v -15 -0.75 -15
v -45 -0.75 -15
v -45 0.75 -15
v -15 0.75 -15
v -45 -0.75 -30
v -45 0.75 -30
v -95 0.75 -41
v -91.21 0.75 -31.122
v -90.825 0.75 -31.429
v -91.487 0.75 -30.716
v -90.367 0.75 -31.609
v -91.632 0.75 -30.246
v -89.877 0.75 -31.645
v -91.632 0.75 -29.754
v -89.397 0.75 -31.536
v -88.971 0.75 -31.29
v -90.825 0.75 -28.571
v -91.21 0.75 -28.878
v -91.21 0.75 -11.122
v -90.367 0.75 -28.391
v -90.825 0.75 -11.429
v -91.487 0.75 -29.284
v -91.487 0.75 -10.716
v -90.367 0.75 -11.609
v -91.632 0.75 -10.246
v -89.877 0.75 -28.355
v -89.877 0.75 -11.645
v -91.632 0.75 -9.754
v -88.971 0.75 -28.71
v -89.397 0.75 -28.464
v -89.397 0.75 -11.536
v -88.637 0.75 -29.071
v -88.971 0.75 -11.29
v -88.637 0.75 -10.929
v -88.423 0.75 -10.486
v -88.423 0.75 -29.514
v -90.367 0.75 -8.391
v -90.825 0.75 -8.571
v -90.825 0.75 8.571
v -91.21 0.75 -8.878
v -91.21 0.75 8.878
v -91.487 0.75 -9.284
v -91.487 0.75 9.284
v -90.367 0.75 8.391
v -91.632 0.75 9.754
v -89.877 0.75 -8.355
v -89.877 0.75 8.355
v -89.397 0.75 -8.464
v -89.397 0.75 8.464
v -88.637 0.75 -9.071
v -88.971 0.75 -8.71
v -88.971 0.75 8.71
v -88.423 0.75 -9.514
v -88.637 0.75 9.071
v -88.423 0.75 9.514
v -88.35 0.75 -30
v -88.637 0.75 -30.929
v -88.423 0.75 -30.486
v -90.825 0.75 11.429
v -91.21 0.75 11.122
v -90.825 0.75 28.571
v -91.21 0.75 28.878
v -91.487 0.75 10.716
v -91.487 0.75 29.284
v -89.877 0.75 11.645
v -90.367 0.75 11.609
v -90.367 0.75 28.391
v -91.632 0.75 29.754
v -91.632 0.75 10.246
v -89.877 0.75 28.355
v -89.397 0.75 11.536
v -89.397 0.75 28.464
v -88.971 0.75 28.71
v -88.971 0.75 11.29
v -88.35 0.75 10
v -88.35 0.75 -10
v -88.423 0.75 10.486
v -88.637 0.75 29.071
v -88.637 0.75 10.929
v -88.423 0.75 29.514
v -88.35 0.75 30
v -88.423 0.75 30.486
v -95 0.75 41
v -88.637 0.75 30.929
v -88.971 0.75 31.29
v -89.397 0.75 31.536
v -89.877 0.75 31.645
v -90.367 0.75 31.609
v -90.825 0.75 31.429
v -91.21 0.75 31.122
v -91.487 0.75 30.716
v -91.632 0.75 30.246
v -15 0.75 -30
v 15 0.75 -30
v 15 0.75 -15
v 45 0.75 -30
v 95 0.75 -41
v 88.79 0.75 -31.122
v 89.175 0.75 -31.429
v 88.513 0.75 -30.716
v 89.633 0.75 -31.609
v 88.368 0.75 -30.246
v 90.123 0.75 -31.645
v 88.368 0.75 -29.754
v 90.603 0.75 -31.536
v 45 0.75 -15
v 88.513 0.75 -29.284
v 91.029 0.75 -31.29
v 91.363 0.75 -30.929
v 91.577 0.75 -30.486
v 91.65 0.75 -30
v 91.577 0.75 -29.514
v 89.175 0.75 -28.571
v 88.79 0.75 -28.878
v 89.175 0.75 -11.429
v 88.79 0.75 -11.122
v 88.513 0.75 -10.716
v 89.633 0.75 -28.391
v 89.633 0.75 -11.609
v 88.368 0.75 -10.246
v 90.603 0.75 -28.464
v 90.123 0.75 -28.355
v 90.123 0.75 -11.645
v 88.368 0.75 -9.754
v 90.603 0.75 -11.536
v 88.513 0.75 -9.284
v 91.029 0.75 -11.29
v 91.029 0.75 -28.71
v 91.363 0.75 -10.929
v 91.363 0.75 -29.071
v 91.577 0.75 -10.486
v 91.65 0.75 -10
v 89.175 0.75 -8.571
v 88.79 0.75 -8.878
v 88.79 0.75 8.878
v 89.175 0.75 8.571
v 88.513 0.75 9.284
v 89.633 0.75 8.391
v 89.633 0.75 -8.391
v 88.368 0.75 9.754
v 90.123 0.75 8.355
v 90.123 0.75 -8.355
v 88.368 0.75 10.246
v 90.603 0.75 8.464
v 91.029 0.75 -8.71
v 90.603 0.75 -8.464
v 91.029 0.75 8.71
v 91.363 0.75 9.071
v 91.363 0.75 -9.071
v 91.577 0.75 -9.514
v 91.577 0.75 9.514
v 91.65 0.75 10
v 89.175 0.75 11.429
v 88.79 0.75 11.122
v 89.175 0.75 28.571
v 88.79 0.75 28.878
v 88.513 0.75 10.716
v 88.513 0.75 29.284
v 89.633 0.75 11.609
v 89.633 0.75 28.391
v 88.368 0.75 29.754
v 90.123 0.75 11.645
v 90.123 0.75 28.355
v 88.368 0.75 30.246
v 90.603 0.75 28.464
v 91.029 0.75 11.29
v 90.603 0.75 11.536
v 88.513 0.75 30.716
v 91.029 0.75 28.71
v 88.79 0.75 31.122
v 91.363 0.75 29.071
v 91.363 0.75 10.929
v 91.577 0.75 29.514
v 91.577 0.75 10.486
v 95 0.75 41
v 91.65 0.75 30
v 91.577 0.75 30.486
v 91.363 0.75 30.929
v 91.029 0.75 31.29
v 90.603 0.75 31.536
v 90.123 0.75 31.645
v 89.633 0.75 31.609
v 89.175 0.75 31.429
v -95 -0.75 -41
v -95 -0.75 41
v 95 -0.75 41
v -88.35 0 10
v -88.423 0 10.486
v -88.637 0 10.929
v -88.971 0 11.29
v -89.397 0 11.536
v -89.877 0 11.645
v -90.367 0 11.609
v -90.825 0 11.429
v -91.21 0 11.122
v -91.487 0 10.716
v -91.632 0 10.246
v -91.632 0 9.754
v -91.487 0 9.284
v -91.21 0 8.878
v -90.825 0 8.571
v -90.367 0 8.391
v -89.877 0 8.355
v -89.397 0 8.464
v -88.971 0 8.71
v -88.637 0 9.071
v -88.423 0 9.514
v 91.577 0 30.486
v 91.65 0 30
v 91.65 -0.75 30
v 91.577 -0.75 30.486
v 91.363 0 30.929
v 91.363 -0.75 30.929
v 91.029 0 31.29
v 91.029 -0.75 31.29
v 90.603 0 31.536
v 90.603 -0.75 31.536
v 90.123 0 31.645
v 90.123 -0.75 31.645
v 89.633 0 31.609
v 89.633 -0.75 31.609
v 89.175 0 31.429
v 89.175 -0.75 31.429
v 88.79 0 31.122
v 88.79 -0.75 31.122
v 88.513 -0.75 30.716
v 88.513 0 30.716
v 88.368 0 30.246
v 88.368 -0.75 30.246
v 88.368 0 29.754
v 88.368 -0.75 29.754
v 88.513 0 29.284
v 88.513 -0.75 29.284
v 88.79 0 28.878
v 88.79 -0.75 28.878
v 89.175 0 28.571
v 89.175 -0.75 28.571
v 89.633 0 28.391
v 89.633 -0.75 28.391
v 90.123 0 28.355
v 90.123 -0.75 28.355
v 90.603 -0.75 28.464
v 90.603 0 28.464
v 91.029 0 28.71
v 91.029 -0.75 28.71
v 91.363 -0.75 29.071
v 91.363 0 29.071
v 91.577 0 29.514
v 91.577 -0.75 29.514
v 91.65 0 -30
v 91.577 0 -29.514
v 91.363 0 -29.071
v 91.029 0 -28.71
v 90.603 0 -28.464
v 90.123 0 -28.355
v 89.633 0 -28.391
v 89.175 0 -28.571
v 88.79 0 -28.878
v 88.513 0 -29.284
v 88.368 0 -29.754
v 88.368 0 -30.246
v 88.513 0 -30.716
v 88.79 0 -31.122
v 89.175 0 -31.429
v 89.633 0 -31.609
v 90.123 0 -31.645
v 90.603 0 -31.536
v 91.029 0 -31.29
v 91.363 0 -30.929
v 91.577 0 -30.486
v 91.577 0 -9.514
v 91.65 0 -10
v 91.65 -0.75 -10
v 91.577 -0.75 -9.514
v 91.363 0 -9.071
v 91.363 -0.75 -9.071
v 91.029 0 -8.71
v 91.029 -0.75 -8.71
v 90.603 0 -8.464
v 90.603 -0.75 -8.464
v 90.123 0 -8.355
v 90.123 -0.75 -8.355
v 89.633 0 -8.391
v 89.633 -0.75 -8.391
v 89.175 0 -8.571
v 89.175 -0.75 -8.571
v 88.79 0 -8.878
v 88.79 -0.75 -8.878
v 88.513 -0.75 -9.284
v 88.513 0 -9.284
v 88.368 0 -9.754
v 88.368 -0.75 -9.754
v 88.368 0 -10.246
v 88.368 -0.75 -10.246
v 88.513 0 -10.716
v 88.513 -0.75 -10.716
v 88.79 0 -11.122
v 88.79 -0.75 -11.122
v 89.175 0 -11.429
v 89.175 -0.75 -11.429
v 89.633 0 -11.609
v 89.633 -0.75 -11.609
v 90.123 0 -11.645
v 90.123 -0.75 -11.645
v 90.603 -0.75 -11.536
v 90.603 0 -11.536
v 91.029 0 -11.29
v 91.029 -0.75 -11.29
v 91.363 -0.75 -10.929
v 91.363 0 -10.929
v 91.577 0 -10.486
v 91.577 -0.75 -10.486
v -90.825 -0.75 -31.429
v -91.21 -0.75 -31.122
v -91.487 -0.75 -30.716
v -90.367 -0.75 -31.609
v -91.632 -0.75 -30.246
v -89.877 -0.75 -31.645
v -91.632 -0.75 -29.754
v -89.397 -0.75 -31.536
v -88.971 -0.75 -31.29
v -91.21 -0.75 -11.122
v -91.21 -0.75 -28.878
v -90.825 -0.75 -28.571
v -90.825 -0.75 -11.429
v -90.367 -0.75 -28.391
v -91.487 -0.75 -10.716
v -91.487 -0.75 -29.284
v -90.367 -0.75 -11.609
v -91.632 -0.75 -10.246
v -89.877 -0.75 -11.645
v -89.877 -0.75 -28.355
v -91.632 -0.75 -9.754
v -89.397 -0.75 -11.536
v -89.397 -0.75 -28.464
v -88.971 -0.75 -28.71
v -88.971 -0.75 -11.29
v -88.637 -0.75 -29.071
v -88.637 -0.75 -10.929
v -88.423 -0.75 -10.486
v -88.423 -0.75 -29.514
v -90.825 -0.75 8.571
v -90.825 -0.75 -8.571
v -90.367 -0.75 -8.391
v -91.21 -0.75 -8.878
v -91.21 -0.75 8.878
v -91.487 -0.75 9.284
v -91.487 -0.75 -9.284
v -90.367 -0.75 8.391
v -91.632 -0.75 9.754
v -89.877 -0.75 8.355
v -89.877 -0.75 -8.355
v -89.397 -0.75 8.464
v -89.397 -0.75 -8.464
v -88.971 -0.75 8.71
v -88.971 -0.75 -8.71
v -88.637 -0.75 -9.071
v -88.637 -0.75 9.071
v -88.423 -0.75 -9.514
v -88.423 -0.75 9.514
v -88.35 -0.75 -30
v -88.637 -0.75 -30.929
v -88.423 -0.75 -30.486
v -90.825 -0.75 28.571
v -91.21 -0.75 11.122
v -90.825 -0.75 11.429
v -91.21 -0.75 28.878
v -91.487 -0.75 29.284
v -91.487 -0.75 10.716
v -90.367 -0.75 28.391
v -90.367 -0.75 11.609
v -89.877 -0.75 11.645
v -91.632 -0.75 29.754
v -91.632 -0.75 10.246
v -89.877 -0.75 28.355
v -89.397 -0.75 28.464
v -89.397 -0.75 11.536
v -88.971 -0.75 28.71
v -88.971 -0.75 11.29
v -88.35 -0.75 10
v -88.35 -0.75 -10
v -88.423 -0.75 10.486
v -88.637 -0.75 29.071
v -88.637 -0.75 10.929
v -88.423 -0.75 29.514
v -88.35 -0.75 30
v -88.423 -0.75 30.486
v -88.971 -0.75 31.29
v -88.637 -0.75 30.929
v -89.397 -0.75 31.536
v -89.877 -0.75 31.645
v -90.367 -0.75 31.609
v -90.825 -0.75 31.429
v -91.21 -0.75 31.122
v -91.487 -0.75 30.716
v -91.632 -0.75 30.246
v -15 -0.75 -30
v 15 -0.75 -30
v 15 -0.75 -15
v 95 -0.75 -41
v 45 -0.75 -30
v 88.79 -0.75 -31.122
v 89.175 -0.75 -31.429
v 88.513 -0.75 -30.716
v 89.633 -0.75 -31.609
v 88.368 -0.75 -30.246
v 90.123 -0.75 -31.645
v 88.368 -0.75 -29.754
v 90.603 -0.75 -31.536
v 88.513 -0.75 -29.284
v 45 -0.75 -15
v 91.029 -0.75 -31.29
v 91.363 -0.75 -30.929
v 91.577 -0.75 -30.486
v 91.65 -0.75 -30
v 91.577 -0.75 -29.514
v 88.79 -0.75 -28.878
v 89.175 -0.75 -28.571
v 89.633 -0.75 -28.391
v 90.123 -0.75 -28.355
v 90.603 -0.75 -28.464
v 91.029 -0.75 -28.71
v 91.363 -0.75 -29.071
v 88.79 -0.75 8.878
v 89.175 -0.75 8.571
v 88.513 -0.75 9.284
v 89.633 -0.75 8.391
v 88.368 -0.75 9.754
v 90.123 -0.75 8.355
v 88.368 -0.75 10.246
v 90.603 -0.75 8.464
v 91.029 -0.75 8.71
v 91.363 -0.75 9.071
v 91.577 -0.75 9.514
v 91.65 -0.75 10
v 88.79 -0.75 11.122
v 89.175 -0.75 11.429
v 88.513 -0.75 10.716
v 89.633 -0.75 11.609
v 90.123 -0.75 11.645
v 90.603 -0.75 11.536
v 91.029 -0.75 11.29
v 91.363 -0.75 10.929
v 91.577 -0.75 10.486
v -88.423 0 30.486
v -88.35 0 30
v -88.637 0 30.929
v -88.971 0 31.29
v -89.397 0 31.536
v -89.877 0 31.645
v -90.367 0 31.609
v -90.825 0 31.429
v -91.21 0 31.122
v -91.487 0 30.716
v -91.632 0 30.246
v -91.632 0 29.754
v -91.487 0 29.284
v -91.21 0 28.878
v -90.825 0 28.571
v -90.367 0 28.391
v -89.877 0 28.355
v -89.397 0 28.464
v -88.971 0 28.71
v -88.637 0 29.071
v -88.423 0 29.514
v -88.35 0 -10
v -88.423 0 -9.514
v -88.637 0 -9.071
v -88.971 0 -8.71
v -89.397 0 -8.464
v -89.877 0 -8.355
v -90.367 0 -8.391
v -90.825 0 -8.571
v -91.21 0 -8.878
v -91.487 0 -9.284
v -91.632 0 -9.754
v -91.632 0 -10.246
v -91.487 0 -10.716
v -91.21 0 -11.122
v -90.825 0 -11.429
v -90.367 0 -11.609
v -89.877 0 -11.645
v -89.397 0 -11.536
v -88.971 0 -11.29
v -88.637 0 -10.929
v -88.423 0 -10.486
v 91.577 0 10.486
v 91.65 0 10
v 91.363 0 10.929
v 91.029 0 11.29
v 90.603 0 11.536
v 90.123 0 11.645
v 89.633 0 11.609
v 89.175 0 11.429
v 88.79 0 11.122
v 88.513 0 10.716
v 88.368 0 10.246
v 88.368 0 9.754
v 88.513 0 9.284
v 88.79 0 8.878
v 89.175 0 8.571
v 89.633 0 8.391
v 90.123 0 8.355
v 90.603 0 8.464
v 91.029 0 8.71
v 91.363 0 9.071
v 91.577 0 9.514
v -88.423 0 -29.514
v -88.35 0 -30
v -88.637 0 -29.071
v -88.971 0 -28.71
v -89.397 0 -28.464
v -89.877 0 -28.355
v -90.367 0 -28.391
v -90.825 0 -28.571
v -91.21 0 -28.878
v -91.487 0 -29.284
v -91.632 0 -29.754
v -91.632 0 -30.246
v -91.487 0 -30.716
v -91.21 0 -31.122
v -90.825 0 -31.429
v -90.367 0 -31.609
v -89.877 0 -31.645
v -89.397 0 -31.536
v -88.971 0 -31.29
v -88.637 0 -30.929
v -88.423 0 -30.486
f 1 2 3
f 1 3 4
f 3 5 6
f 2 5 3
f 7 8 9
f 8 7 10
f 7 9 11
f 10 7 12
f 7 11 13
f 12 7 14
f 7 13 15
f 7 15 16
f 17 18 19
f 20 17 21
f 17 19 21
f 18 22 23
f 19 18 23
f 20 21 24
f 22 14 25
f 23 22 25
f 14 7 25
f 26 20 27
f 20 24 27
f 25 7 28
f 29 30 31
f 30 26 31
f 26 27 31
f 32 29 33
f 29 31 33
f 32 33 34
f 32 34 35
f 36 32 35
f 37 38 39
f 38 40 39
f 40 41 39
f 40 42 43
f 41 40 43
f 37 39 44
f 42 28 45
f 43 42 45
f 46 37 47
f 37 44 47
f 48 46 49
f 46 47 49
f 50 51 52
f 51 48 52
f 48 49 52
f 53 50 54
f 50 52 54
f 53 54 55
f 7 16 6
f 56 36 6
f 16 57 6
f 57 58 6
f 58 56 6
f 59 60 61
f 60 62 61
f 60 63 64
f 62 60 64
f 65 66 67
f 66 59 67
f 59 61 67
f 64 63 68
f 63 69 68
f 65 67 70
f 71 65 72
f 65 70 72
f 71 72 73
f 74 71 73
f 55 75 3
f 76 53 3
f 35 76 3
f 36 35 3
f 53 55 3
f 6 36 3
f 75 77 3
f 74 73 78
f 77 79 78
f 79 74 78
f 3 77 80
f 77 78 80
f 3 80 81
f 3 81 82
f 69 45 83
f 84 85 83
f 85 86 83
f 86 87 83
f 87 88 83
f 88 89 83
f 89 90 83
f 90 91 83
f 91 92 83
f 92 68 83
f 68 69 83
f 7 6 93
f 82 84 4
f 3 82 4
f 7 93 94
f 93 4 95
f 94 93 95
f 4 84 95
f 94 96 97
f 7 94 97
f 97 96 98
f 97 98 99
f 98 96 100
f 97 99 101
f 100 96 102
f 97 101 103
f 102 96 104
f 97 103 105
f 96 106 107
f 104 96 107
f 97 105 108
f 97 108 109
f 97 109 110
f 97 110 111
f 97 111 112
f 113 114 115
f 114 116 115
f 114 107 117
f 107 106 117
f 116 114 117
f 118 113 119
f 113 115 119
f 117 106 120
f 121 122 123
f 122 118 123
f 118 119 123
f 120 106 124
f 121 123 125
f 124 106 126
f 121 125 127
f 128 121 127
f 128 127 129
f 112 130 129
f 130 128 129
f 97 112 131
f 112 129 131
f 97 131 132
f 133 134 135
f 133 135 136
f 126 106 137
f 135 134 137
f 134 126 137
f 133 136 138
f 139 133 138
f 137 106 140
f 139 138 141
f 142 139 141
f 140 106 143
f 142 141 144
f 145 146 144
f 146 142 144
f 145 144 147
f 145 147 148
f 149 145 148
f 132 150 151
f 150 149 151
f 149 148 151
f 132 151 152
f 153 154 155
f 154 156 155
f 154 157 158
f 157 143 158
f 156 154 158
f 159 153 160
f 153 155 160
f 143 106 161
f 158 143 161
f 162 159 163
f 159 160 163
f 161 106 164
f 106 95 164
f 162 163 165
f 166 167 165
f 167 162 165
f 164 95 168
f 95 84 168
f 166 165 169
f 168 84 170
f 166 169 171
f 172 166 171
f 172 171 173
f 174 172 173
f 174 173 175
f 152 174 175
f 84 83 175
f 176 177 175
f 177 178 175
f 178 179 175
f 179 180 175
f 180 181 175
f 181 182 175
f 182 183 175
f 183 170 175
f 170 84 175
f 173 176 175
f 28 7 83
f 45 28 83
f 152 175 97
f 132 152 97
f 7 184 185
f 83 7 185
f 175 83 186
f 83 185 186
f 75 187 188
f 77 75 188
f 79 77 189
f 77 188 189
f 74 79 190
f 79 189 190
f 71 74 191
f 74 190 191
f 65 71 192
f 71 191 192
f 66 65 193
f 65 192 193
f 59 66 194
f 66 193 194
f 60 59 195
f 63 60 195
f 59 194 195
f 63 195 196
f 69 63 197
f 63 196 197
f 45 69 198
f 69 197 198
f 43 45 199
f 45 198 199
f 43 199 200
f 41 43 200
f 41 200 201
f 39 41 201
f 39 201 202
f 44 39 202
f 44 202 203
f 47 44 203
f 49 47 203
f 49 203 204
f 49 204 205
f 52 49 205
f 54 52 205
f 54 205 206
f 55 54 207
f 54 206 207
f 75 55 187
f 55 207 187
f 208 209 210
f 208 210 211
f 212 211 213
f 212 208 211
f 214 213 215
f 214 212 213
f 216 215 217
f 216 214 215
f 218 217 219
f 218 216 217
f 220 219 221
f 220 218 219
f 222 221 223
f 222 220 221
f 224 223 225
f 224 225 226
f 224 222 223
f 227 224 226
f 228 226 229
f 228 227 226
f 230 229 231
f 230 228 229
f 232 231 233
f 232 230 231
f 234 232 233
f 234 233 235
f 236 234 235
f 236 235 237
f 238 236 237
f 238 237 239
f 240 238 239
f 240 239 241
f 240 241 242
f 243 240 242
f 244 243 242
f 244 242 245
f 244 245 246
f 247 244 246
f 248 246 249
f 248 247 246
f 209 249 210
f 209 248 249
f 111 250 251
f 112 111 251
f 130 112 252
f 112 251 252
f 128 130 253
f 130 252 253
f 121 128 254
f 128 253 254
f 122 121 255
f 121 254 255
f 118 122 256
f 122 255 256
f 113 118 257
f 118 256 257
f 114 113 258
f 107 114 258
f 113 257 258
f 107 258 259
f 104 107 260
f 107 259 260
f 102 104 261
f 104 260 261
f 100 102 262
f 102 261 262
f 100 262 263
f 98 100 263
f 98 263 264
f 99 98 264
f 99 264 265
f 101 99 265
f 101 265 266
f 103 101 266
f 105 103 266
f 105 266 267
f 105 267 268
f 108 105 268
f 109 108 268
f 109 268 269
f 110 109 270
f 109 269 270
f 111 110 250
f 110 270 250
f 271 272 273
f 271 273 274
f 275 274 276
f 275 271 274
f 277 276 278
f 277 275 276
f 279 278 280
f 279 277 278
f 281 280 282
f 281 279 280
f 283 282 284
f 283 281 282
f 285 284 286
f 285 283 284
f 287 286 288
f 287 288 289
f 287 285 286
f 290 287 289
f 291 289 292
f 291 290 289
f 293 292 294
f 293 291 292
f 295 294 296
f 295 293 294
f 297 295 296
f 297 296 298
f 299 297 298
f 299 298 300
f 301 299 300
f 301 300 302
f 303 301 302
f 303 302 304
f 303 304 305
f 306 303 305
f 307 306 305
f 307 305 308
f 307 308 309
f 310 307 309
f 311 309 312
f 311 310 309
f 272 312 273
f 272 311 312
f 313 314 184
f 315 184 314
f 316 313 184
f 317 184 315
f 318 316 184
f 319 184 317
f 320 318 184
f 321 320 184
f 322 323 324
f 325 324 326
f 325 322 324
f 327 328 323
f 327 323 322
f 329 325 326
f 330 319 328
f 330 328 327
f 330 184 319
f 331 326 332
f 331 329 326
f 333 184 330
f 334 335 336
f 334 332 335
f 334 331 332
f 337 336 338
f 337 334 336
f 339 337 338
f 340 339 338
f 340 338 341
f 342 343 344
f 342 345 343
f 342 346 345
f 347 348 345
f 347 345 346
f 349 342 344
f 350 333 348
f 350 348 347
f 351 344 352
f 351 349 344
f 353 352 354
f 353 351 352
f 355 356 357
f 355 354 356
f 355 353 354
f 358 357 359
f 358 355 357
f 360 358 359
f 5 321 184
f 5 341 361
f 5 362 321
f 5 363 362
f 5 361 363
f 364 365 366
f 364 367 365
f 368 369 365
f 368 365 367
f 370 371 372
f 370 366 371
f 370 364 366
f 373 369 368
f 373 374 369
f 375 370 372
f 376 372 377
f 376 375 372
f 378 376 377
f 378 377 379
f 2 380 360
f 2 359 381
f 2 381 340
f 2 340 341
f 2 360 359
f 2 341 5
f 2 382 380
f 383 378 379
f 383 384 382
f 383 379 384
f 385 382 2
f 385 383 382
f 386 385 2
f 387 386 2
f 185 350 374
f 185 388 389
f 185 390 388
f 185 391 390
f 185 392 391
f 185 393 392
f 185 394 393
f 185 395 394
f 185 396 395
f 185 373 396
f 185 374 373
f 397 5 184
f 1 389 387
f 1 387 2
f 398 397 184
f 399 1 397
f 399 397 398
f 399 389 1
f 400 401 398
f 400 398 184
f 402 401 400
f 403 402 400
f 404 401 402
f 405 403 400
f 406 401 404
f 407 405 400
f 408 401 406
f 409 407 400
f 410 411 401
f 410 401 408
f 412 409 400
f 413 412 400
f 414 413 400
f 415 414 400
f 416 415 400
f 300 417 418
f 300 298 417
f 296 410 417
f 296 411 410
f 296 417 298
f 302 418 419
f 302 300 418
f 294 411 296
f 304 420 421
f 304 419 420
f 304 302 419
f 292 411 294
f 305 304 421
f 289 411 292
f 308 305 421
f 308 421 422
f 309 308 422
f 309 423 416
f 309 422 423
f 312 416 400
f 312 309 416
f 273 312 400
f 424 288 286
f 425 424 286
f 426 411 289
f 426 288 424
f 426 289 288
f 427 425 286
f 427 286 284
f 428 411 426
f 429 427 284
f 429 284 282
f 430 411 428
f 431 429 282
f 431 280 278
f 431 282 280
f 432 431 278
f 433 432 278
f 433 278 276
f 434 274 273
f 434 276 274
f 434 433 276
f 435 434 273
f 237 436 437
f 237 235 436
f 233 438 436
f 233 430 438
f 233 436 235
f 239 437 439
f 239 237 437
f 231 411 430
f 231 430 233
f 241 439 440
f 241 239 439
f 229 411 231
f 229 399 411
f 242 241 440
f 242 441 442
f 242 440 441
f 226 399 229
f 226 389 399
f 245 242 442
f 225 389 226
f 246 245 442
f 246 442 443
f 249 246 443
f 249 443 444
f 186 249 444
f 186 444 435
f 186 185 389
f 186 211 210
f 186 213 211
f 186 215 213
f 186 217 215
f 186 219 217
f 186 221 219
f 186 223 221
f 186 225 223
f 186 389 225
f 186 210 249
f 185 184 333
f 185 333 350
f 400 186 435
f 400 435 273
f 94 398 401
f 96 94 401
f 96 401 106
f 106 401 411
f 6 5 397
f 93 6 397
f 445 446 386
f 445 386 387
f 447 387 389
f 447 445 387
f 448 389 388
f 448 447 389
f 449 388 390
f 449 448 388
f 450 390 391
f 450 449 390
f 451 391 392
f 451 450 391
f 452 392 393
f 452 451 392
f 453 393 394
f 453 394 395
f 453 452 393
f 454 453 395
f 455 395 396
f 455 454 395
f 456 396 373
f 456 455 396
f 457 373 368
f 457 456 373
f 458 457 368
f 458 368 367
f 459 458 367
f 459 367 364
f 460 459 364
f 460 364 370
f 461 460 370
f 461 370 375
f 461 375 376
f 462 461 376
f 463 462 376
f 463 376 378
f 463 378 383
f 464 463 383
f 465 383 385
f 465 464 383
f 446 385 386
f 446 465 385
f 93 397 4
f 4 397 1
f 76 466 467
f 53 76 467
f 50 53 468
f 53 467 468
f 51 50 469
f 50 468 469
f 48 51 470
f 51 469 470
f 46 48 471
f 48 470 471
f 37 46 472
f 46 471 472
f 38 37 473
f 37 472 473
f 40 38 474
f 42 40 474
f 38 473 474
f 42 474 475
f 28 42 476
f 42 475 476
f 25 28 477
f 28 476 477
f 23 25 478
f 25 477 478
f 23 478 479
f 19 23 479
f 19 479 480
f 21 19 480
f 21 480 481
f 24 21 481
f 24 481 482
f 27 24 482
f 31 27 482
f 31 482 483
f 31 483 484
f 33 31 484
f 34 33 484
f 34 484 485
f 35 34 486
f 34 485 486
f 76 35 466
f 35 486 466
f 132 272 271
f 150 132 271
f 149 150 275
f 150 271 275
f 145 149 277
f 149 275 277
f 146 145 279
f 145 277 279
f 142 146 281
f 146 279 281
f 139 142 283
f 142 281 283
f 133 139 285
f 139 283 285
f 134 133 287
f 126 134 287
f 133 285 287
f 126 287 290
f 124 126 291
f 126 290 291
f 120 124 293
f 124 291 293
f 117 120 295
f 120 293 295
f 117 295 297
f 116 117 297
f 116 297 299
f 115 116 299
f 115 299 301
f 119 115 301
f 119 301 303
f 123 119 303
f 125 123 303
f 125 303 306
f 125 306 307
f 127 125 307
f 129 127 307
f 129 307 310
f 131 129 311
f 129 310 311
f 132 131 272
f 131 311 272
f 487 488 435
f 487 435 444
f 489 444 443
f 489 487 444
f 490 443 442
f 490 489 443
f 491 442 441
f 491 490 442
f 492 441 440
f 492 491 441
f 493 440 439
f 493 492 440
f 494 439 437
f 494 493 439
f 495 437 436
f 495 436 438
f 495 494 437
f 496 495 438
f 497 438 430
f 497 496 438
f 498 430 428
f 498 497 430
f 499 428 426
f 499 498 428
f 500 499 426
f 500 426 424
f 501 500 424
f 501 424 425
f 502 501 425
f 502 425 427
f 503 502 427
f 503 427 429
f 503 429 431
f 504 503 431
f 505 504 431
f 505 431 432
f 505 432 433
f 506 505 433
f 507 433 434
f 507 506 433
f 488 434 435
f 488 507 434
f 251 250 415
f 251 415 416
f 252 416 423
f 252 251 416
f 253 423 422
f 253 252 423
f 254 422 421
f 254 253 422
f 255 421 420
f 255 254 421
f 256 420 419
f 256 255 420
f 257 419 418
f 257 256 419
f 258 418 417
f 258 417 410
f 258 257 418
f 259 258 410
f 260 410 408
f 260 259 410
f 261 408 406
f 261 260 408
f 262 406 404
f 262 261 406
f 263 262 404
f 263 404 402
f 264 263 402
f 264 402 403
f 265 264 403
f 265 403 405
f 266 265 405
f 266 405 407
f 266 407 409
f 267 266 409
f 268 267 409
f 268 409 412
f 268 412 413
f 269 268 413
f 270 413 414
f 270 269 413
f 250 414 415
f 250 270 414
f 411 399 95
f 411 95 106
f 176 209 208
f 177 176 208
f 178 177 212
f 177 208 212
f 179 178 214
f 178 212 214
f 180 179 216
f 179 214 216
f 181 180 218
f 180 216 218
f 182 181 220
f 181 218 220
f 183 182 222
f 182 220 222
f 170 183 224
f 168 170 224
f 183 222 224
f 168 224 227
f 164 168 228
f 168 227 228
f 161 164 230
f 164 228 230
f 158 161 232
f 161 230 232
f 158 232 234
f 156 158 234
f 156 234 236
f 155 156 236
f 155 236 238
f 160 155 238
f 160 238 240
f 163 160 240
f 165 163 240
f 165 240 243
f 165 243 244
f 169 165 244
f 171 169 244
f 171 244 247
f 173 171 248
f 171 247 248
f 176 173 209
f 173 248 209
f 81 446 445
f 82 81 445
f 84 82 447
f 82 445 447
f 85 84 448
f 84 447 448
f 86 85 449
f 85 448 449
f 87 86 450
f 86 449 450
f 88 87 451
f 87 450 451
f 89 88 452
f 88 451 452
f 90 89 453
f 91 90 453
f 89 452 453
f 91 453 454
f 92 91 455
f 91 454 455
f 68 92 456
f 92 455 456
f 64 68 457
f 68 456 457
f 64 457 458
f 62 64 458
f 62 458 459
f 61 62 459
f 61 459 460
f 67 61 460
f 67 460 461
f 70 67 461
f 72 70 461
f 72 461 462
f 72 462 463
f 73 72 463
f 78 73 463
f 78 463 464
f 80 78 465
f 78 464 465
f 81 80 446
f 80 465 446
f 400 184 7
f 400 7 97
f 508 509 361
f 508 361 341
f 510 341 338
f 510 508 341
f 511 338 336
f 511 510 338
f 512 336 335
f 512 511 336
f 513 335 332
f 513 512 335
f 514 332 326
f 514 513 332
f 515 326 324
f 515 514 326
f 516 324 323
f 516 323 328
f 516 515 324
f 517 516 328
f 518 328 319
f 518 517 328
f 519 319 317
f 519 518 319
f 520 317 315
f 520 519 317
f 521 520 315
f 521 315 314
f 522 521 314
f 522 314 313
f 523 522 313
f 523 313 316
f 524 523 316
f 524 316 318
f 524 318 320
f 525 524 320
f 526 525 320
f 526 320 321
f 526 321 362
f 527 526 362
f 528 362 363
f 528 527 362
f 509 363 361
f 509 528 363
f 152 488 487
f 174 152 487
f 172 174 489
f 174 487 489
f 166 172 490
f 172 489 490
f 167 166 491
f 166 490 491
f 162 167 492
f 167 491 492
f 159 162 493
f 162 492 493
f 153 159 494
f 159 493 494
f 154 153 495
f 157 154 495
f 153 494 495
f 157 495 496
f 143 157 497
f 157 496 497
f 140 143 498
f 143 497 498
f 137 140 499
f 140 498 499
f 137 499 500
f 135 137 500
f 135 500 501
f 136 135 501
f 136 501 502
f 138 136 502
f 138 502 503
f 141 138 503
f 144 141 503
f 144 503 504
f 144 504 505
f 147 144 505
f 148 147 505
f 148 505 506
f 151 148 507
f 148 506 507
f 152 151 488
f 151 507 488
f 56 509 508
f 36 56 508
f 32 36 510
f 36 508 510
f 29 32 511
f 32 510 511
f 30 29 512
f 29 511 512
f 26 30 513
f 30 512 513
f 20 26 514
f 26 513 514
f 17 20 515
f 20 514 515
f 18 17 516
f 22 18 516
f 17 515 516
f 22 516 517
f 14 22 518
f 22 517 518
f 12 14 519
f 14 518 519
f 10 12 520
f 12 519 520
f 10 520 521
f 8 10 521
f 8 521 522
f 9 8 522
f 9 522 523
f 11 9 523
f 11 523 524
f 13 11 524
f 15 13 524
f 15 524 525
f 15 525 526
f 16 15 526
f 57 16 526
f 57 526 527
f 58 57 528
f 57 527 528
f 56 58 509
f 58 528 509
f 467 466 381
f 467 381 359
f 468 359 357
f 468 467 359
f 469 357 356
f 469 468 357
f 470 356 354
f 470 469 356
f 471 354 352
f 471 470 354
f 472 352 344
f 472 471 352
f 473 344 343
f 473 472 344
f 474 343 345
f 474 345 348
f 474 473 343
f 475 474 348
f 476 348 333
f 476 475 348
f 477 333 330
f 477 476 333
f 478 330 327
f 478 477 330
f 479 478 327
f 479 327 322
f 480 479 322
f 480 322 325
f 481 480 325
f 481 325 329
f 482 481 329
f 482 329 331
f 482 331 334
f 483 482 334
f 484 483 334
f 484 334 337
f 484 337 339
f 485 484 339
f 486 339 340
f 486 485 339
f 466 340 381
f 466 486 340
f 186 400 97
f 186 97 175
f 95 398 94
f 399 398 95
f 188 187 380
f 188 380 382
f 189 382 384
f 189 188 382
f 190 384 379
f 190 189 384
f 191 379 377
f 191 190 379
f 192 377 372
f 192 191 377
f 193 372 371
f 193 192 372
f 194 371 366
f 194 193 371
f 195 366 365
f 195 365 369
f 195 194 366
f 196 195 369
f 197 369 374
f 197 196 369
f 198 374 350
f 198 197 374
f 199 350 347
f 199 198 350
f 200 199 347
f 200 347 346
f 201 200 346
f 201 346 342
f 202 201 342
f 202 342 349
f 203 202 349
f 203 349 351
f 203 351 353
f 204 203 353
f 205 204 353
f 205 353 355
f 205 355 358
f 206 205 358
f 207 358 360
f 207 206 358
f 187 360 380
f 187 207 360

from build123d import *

# Parameters (mm, degrees)
SKETCH_W       = 190
SKETCH_H       = 82
SKETCH_R       = 1.65
PAD_DEPTH      = 0.75
PAD_DEPTH_BACK = 0.75
SKETCH001_W    = 30
SKETCH001_H    = 15
POCKET_DEPTH   = 5


with BuildPart() as part:
    # Sketch → Pad (new body, two sides)
    with BuildSketch(Plane.XZ) as pad_sk:
        Rectangle(SKETCH_W, SKETCH_H)
        with Locations((90, 30)):
            Circle(SKETCH_R, mode=Mode.SUBTRACT)
        with Locations((90, 10)):
            Circle(SKETCH_R, mode=Mode.SUBTRACT)
        with Locations((90, -30)):
            Circle(SKETCH_R, mode=Mode.SUBTRACT)
        with Locations((90, -10)):
            Circle(SKETCH_R, mode=Mode.SUBTRACT)
        with Locations((-90, 30)):
            Circle(SKETCH_R, mode=Mode.SUBTRACT)
        with Locations((-90, 10)):
            Circle(SKETCH_R, mode=Mode.SUBTRACT)
        with Locations((-90, -30)):
            Circle(SKETCH_R, mode=Mode.SUBTRACT)
        with Locations((-90, -10)):
            Circle(SKETCH_R, mode=Mode.SUBTRACT)
    extrude(amount=PAD_DEPTH)
    extrude(pad_sk.sketch, amount=-PAD_DEPTH_BACK)

    # Sketch001 (on Face14 of Pad) → Pocket (cut)
    with BuildSketch(Plane.XZ.offset(0.75)):
        with Locations((-30, -22.5)):
            Rectangle(SKETCH001_W, SKETCH001_H)
        with Locations((30, -22.5)):
            Rectangle(SKETCH001_W, SKETCH001_H)
    extrude(amount=-POCKET_DEPTH, mode=Mode.SUBTRACT)


solid = part.part
